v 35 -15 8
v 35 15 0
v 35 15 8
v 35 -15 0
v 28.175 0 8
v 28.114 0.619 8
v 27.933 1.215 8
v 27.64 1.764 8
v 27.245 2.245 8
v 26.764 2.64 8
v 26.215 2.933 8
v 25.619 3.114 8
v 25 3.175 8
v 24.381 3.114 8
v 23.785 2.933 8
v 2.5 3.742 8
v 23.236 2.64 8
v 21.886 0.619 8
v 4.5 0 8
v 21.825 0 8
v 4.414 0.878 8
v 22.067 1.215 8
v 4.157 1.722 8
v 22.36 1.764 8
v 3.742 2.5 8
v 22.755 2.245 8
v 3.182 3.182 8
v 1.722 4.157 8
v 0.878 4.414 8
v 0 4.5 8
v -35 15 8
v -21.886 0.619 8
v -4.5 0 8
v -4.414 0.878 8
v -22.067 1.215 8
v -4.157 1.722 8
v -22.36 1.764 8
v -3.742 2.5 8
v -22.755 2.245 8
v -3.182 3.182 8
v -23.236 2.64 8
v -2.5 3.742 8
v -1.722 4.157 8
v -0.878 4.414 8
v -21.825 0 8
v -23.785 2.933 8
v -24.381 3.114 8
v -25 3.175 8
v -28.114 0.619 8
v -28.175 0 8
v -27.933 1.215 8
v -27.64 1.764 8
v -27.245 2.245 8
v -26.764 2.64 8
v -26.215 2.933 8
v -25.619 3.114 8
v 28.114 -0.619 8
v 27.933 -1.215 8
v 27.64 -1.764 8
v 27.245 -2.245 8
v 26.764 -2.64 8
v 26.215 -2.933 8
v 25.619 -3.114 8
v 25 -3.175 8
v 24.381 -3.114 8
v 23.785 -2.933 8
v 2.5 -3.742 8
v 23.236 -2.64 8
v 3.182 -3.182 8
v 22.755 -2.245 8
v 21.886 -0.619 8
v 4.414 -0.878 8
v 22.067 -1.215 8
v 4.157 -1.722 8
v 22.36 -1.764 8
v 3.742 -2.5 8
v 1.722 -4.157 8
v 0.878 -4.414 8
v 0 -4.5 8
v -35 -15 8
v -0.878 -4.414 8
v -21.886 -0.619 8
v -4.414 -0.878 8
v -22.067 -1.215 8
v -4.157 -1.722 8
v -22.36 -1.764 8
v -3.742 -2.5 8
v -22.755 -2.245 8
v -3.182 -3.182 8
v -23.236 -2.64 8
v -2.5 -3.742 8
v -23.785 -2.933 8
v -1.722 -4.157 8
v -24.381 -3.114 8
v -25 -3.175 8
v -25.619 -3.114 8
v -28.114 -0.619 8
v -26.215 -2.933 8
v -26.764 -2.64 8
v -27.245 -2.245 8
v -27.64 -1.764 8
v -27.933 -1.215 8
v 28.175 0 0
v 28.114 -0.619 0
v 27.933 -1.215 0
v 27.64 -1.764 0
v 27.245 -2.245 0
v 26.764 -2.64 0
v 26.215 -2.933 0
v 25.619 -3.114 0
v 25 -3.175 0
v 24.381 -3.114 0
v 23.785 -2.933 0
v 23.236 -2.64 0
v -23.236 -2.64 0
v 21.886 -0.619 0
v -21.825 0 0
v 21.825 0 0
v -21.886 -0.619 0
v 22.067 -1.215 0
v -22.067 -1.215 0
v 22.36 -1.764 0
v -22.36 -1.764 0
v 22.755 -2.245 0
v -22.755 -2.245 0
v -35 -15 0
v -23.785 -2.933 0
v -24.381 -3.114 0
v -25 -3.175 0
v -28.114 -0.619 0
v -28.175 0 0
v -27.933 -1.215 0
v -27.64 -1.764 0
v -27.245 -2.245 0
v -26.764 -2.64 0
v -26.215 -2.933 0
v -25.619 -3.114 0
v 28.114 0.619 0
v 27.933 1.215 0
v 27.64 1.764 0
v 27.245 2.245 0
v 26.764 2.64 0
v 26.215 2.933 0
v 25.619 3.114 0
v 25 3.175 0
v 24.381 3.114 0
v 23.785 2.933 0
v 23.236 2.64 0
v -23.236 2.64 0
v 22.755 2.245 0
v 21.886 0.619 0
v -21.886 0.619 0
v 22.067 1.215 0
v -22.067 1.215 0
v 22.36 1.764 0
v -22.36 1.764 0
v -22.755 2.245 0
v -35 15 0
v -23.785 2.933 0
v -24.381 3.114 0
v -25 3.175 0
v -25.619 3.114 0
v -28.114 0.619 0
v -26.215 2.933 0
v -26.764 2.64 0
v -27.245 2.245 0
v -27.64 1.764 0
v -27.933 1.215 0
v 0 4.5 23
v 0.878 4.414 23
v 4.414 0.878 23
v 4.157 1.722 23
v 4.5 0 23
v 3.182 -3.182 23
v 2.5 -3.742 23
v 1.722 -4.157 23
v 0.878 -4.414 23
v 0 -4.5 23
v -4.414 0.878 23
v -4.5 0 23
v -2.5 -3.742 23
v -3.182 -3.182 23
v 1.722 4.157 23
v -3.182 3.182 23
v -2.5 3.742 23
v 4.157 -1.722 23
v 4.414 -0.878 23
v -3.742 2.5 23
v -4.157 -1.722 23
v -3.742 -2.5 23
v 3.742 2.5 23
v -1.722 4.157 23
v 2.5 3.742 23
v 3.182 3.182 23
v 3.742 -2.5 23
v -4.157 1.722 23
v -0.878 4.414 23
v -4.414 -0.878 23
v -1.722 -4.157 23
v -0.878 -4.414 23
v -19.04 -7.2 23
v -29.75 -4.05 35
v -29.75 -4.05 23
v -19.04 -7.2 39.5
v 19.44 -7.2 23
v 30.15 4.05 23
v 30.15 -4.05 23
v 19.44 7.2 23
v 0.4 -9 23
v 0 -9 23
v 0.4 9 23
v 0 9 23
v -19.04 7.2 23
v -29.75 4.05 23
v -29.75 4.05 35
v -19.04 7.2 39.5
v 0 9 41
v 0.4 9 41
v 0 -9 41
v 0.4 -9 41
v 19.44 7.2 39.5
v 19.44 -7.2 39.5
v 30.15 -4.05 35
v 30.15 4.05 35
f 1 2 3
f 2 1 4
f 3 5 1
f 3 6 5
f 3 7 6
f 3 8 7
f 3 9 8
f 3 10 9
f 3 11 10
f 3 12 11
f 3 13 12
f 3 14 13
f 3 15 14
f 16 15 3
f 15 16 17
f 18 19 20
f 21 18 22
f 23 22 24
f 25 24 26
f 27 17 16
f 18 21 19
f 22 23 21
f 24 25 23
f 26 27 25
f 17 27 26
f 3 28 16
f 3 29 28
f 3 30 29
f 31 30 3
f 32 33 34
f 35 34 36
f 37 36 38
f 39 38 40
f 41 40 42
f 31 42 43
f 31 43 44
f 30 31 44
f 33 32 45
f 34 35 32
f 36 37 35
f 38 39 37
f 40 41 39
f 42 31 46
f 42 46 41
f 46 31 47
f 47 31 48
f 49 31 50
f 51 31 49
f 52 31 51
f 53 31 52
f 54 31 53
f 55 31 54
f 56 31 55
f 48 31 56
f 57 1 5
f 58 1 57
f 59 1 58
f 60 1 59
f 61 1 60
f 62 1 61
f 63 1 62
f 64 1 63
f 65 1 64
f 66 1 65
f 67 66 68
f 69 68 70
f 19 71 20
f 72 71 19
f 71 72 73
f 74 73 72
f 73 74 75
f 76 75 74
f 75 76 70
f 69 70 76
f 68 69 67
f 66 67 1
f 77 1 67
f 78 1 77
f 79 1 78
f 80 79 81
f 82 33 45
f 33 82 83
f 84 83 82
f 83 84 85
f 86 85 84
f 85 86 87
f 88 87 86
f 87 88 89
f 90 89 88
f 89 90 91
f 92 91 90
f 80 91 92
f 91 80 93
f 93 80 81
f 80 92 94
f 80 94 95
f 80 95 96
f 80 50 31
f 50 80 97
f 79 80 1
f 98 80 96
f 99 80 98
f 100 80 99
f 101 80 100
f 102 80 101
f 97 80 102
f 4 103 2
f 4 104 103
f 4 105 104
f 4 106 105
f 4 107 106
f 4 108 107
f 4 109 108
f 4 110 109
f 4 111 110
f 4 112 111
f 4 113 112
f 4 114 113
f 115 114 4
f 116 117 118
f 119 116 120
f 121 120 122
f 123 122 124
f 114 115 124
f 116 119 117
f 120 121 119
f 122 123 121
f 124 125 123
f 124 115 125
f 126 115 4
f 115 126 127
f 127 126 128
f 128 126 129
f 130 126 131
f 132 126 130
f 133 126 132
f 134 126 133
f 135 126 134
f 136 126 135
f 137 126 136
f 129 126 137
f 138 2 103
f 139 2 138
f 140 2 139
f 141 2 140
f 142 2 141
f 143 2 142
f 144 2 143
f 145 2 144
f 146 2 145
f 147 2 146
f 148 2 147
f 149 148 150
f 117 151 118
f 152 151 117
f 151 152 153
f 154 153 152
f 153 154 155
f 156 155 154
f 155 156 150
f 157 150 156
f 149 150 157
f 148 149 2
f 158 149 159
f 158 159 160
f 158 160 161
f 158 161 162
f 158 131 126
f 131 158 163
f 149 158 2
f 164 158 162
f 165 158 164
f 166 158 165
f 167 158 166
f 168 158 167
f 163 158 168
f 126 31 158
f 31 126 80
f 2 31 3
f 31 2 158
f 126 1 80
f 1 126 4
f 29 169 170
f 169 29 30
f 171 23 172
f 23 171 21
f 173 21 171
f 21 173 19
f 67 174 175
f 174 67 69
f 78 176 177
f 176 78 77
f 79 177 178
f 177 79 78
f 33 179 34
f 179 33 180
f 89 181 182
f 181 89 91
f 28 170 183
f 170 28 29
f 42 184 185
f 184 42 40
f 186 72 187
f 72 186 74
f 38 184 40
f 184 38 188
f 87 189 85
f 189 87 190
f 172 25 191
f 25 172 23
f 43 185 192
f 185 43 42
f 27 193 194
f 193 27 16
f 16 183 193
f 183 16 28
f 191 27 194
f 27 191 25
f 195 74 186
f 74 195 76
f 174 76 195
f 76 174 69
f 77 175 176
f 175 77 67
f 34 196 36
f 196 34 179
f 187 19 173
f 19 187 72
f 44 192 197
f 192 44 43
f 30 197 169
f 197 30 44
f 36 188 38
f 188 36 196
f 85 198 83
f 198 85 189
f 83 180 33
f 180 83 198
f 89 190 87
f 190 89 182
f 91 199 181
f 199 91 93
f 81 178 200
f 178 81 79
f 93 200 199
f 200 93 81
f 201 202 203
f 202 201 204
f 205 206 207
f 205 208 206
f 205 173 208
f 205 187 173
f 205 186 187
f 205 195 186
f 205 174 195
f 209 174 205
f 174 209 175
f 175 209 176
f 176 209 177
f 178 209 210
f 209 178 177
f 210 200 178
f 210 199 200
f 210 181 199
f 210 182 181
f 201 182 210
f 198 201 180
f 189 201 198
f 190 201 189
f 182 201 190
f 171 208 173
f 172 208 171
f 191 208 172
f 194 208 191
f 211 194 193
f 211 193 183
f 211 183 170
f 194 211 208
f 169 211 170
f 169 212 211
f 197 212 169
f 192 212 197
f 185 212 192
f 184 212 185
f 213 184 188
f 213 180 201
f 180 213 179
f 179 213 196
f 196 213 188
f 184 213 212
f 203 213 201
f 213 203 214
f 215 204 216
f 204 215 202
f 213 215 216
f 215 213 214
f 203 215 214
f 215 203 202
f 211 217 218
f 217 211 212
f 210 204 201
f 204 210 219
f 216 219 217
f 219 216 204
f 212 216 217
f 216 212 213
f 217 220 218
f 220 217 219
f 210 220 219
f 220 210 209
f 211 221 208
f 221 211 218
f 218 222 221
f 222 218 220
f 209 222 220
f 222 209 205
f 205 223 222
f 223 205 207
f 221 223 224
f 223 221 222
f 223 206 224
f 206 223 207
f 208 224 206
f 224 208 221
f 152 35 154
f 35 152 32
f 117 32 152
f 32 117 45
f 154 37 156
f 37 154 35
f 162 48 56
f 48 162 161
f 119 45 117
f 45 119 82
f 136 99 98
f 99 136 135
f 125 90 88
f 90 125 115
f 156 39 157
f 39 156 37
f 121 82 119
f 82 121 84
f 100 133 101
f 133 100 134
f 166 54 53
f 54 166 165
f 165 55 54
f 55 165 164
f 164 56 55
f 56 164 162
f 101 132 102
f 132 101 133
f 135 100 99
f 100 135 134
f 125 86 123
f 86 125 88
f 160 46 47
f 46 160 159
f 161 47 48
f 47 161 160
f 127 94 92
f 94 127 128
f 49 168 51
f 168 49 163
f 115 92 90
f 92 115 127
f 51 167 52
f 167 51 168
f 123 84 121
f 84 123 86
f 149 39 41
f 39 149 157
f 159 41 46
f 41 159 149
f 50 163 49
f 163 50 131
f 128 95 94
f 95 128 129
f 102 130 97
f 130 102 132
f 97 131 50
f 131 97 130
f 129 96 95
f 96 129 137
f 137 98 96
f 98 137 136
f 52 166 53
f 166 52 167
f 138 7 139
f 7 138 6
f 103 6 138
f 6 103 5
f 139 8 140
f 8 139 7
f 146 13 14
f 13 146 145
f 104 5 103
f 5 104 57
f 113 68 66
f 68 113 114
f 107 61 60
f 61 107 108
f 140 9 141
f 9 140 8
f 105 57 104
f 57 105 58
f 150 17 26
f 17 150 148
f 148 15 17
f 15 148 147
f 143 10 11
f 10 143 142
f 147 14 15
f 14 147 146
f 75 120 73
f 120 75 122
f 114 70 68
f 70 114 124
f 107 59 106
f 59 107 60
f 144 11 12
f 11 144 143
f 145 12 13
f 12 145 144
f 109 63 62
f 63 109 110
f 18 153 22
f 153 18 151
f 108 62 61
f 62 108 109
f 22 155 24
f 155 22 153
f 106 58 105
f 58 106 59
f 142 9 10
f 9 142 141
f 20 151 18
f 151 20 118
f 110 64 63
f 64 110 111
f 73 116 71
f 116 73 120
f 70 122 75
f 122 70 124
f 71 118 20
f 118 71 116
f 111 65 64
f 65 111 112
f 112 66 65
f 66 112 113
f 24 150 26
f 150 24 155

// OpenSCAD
$fn = 32;

// ----------------------------------------------------------------------
// Boat cleat: 70 mm base, horn 32 mm up
// ----------------------------------------------------------------------

// --- parameters (mm) ---
base_l = 70;              // base length
base_w = 30;              // base width
base_t = 8;               // base thickness
horn_len = 59.5;          // horn length
horn_d = 18;              // horn diameter at the middle
horn_z = 32;              // horn axis height
end_drop = 6;             // how far the horn tips drop
post_d = 9;               // centre post diameter
holes_d = 6.35;           // fixing holes
hole_x = 25;              // fixing hole spacing

difference() {
  union() {
    translate([-35, -15, 0]) cube([base_l, base_w, base_t]);
    /* centre post, sunk 1 mm into the base */
    translate([0, 0, 7]) cylinder(h = 25, d = post_d);
    /* horn: a hull chain of boxes, full in the middle and lighter at the tips */
    hull() {
      translate([-29.75, -4.05, 23]) cube([0.4, 8.1, 12], center = false);
      translate([-19.04, -7.2, 23]) cube([0.4, 14.4, 16.5], center = false);
    }
    hull() {
      translate([-19.04, -7.2, 23]) cube([0.4, 14.4, 16.5], center = false);
      translate([0, -9, 23]) cube([0.4, 18, 18], center = false);
    }
    hull() {
      translate([0, -9, 23]) cube([0.4, 18, 18], center = false);
      translate([19.04, -7.2, 23]) cube([0.4, 14.4, 16.5], center = false);
    }
    hull() {
      translate([19.04, -7.2, 23]) cube([0.4, 14.4, 16.5], center = false);
      translate([29.75, -4.05, 23]) cube([0.4, 8.1, 12], center = false);
    }
  }
  translate([-25, 0, -2.5]) cylinder(h = base_t + 5, d = holes_d);
  translate([25, 0, -2.5]) cylinder(h = base_t + 5, d = holes_d);
}
